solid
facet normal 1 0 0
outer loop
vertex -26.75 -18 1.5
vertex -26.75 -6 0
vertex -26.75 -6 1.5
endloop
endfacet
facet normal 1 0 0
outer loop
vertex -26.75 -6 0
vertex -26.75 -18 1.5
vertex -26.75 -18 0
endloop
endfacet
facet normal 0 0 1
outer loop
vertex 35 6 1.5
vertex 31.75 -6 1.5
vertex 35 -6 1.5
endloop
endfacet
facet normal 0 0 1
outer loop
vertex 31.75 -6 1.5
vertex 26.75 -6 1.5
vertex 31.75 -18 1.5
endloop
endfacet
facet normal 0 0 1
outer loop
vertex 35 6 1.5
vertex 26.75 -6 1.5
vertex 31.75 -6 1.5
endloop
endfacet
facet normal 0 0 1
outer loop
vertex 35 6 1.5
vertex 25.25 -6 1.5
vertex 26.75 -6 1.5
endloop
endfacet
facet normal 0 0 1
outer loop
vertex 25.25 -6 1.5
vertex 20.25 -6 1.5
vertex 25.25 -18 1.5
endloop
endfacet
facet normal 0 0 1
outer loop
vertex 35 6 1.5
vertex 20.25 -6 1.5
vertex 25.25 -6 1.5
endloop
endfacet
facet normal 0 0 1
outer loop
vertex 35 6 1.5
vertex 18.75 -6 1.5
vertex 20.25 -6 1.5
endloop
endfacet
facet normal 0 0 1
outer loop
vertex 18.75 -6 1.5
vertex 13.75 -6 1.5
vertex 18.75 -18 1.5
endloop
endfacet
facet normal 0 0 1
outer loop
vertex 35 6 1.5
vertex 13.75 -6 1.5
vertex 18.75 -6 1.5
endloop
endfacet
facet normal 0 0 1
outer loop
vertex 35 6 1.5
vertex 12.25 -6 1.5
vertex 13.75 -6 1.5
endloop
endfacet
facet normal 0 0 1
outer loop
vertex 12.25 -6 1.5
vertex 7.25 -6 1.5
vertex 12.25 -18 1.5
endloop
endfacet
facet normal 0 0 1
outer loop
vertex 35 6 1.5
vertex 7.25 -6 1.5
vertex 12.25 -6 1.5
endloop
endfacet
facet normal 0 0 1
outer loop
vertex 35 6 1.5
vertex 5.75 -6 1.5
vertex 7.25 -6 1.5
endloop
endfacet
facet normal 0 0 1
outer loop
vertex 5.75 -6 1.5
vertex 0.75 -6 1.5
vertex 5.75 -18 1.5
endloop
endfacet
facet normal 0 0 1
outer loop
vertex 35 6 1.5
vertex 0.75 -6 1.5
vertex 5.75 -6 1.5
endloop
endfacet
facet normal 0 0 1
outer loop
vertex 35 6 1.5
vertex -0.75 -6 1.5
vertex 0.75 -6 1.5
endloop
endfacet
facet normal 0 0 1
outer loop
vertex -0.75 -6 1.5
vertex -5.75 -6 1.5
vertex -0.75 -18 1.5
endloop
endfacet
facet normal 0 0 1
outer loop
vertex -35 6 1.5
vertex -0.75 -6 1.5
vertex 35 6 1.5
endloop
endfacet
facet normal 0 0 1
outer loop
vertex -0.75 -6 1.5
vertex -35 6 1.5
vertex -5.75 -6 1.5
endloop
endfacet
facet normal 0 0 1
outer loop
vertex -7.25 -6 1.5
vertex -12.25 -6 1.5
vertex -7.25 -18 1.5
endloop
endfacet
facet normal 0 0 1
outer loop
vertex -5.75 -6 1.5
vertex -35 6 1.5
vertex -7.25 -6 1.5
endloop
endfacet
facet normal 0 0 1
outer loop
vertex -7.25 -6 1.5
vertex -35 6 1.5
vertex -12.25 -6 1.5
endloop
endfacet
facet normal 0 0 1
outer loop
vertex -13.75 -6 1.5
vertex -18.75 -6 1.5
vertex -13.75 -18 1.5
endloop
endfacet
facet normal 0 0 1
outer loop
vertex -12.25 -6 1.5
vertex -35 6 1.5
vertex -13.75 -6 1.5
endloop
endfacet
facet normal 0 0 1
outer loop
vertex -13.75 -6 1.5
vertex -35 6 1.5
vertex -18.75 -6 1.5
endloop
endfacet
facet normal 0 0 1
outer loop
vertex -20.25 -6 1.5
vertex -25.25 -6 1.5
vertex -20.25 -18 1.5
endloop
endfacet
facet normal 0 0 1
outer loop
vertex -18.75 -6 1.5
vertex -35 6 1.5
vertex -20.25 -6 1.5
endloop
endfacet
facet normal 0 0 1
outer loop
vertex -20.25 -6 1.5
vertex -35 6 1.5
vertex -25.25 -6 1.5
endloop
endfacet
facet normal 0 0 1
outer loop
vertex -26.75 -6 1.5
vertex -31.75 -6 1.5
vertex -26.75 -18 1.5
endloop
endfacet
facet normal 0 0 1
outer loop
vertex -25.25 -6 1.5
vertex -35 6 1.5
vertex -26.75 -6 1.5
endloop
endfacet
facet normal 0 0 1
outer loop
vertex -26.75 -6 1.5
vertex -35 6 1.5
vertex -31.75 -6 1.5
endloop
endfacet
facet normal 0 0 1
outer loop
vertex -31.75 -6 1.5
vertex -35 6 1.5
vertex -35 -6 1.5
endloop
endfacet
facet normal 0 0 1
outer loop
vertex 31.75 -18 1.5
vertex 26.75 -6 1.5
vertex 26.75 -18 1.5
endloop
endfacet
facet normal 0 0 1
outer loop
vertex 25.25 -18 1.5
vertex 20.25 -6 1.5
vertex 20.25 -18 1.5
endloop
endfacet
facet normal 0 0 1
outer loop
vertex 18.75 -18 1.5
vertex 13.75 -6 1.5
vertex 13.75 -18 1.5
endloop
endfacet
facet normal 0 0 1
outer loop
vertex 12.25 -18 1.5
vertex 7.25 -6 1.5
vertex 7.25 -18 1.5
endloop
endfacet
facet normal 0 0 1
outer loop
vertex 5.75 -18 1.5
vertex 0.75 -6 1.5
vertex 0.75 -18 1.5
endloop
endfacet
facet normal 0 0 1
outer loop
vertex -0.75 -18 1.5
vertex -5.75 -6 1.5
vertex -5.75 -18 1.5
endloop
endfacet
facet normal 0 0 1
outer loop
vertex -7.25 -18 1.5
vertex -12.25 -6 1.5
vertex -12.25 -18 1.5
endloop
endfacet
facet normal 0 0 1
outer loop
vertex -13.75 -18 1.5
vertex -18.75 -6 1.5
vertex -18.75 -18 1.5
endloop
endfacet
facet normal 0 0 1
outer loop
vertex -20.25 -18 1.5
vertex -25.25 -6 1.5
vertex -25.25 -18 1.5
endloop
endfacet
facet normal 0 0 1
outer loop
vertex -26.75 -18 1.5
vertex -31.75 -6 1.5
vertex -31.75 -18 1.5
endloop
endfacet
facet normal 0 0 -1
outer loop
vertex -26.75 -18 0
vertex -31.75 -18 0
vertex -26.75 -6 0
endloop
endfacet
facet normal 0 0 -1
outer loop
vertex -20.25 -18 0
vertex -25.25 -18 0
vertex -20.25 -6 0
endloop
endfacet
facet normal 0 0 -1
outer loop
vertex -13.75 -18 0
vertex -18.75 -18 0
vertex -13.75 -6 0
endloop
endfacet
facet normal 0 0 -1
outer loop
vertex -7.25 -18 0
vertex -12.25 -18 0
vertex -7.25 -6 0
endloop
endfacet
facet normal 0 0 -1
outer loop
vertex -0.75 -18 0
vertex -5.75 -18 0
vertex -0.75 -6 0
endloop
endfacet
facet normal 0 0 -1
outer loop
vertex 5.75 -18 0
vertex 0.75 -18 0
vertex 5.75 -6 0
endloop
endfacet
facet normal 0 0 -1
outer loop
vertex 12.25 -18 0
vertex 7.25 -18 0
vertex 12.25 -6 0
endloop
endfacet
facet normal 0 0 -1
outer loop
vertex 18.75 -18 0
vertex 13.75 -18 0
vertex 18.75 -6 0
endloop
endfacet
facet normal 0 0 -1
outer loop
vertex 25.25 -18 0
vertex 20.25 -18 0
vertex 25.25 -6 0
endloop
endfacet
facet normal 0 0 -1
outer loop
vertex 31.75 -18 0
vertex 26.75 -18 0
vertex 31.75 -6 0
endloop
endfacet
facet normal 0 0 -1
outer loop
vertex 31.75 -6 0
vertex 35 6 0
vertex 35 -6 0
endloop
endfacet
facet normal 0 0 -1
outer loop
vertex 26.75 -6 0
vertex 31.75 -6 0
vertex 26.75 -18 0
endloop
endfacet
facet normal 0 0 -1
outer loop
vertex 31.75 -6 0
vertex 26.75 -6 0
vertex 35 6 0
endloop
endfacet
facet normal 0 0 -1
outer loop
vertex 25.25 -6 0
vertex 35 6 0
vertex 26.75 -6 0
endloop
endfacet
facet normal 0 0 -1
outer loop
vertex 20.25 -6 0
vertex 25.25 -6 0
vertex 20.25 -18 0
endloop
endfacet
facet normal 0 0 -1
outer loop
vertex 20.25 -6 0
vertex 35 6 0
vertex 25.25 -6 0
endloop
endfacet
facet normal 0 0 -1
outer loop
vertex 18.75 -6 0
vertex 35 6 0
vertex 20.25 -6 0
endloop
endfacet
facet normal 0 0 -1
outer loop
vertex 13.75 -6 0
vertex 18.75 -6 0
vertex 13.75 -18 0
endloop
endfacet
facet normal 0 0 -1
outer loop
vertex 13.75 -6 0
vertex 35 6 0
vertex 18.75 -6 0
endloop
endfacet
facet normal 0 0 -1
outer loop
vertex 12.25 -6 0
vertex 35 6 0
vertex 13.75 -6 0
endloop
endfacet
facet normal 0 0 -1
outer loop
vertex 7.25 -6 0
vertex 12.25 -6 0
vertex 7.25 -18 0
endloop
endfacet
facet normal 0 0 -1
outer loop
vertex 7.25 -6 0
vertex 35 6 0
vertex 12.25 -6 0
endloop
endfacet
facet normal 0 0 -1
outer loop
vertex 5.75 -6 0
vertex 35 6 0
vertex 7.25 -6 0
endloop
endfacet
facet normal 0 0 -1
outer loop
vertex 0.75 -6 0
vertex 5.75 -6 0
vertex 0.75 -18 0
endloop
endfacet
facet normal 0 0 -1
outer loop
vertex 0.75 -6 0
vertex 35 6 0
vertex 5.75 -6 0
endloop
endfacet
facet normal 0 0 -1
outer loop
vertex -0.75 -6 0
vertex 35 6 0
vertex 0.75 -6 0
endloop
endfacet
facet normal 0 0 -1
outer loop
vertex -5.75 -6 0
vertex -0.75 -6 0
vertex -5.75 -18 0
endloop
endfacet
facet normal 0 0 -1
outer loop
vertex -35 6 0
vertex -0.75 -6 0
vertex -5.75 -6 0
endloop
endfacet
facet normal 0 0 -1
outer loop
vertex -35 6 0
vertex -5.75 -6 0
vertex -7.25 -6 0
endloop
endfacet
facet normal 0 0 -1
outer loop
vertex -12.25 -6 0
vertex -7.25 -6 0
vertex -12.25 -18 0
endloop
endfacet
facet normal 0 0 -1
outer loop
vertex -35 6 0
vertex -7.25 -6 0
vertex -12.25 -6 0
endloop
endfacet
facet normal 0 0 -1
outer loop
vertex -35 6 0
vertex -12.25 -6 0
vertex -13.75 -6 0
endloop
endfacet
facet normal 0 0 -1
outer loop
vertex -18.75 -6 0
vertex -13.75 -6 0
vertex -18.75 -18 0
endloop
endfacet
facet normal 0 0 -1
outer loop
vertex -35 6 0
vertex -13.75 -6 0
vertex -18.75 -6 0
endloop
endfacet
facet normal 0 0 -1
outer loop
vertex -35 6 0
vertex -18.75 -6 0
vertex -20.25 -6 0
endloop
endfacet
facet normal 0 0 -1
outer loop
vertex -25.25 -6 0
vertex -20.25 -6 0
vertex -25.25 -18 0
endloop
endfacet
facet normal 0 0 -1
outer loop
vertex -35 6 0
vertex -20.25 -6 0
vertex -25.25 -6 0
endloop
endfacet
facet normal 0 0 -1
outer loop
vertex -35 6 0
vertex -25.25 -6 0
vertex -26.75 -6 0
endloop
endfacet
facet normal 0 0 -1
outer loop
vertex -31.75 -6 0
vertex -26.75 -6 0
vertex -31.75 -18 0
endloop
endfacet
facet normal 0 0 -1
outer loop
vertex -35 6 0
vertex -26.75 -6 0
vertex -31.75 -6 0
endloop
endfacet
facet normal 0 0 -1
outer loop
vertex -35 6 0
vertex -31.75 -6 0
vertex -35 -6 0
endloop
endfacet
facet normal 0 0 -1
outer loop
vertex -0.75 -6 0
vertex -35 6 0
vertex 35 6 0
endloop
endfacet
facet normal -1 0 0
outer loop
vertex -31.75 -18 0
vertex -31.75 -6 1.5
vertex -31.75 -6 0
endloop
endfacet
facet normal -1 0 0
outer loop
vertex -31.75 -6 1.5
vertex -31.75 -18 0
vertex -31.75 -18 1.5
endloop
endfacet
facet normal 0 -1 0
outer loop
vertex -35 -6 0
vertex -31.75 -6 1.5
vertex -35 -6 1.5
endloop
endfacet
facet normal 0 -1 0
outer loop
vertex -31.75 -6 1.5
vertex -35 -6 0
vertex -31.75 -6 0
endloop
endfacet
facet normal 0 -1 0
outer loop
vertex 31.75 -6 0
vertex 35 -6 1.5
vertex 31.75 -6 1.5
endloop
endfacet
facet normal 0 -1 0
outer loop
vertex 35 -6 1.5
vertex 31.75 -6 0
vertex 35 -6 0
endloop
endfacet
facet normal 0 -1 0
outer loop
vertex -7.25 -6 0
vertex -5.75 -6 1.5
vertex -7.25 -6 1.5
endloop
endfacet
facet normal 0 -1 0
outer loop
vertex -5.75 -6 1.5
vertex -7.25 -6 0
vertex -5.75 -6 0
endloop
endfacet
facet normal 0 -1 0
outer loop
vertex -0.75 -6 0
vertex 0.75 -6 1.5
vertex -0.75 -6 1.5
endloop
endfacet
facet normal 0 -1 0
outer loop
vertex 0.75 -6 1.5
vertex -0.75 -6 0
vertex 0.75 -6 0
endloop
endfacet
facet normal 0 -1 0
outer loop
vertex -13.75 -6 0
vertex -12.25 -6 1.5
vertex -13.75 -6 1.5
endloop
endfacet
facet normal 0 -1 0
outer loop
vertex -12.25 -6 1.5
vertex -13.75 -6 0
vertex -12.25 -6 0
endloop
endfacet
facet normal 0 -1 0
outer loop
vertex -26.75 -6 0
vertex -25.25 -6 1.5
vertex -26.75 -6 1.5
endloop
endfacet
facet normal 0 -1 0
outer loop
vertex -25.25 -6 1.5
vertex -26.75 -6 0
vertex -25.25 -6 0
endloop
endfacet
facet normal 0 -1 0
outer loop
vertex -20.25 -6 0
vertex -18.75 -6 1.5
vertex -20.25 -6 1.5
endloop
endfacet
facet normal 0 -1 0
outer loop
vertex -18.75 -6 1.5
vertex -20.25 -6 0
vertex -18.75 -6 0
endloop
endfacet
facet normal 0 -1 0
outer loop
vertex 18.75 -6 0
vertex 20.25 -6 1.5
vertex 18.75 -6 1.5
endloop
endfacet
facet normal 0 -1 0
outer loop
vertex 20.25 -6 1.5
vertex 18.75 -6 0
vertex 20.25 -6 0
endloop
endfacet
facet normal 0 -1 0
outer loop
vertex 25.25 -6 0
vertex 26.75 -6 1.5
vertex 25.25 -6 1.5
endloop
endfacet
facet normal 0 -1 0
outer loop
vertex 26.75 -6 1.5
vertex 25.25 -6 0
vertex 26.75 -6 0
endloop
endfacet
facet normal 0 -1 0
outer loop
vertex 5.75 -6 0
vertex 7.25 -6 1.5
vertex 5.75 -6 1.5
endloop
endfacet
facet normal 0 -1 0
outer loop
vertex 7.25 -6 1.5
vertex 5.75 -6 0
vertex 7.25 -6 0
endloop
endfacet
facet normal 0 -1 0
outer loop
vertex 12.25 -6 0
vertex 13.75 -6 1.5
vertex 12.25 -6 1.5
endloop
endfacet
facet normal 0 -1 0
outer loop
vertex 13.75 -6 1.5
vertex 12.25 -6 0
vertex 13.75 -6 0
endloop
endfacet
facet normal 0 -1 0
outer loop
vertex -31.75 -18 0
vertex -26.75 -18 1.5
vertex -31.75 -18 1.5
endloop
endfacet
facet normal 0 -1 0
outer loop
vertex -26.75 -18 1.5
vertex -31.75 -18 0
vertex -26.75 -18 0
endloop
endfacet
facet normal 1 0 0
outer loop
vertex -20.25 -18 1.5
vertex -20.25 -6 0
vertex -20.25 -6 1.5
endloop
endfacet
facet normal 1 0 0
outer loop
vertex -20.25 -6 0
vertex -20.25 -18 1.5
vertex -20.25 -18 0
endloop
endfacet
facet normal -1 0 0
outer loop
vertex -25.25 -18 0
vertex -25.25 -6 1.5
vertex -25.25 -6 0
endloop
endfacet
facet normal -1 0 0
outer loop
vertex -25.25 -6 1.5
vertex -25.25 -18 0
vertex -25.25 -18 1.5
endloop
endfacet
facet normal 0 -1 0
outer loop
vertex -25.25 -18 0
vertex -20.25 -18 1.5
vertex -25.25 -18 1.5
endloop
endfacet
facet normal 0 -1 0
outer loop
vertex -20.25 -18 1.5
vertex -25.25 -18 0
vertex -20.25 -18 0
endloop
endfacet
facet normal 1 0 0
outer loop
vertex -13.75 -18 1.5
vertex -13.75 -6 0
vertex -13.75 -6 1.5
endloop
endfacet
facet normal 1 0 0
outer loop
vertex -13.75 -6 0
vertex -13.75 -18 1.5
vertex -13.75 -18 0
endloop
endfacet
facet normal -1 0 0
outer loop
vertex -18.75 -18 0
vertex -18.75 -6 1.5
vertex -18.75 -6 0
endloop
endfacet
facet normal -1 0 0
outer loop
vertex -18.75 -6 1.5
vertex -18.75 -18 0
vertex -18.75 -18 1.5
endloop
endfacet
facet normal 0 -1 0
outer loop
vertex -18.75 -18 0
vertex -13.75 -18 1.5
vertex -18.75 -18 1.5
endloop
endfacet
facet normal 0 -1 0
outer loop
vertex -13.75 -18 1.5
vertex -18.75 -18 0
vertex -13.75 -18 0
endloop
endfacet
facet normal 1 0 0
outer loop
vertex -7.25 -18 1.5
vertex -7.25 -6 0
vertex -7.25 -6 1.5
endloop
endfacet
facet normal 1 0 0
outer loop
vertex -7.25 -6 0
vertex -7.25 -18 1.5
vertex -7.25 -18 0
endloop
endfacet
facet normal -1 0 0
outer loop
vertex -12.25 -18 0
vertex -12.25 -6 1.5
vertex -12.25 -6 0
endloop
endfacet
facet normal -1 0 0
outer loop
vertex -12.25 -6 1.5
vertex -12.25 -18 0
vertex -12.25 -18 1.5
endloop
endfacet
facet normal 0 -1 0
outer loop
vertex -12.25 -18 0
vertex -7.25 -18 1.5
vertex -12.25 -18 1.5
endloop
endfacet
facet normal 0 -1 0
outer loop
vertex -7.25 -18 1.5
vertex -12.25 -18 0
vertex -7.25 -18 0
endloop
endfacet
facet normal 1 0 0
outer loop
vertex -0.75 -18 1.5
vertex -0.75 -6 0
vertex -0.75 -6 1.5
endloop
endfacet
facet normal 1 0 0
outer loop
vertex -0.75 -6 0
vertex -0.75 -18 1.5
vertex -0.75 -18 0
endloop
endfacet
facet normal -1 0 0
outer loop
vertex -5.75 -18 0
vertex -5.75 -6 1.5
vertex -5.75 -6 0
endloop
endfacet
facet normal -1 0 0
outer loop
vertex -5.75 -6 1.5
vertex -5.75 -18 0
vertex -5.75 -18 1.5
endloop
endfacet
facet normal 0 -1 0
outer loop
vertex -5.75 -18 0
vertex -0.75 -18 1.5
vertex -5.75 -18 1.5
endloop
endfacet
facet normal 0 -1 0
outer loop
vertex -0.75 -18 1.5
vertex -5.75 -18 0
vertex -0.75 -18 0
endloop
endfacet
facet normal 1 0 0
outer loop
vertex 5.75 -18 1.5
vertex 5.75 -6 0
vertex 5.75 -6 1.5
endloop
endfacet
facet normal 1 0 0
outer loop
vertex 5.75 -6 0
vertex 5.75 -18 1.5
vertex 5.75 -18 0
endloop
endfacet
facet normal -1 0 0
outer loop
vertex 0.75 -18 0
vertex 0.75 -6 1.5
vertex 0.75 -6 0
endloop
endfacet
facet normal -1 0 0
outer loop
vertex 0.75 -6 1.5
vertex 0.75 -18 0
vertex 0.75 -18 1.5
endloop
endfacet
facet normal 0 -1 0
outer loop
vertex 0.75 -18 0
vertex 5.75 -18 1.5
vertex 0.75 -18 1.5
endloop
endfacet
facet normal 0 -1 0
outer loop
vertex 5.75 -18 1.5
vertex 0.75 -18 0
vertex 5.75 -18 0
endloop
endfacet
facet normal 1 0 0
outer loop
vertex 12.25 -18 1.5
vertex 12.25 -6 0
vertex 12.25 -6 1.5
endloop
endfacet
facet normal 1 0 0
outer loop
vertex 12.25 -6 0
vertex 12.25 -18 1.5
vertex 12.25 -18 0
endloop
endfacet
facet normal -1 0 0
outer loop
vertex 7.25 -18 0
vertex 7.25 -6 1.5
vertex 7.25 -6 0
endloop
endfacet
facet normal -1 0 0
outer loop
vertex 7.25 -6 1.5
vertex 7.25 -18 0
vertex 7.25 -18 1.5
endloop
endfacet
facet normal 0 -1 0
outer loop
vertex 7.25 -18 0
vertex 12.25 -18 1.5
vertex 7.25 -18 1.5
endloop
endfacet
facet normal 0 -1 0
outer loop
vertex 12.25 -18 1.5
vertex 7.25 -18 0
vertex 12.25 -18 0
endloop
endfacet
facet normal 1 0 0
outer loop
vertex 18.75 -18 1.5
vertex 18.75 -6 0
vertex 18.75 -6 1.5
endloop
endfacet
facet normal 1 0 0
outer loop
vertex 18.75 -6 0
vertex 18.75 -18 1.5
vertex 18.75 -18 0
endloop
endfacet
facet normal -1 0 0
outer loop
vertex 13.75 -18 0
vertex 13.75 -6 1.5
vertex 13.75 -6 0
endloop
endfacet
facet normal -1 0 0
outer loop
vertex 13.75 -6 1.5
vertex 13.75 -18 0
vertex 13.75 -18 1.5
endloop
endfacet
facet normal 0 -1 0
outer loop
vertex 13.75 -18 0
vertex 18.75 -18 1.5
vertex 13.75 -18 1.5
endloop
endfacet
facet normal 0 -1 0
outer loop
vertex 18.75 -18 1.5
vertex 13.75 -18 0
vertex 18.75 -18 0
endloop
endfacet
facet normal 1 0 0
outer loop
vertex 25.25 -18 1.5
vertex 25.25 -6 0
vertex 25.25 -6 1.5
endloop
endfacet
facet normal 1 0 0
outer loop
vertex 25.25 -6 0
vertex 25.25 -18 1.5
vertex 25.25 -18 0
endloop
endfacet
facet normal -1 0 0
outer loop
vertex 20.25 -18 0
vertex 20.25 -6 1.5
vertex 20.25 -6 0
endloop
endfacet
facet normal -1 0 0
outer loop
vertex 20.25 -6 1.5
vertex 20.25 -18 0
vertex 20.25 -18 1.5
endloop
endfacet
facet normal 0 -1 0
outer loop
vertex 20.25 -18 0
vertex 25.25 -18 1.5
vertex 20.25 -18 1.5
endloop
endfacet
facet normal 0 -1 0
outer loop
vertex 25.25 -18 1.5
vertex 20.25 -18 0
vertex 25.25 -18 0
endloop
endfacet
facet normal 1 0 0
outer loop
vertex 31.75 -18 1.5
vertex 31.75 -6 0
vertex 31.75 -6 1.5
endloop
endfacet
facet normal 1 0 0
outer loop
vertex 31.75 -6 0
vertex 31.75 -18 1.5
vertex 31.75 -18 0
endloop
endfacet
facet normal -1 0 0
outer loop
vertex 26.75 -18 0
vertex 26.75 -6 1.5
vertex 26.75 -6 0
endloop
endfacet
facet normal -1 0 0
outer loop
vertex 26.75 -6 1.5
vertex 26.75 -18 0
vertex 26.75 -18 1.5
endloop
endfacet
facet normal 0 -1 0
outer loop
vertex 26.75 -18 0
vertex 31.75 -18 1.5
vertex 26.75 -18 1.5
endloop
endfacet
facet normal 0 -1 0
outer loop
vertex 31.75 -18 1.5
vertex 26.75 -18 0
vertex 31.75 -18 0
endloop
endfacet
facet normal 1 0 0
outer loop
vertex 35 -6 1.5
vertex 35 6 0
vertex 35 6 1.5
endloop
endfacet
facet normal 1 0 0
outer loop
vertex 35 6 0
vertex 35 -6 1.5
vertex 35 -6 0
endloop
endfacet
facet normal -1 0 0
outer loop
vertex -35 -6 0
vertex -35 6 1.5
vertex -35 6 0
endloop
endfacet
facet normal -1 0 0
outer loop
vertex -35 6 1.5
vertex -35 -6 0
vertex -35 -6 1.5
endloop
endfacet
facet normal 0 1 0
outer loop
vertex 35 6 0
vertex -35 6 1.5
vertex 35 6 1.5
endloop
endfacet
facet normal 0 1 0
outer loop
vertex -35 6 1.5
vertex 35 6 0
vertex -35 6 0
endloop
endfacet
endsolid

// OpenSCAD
// 10-well comb for casting agarose gels
// Printed lying flat: plate on bed (z = 0), teeth hang in -Y direction

// ---------- Parameters ----------
plate_t      = 1.5;    // plate thickness (Z)
spine_len    = 70;     // spine length along X
spine_w      = 12;     // spine width along Y
tooth_count  = 10;     // number of teeth
tooth_w      = 5.0;    // tooth width along X
tooth_len    = 12;     // tooth length along Y
gap          = 1.5;    // gap between neighbouring teeth (X)
eps          = 0.5;    // cutter overshoot past faces

$fn = 64;

// ---------- Derived ----------
pitch   = tooth_w + gap;               // centre-to-centre spacing
x_start = -(tooth_count - 1) * pitch / 2; // first tooth centre (row centred on spine)
total_w = tooth_count * tooth_w + (tooth_count - 1) * gap; // row width in X

// ---------- Model ----------
union() {
    // Spine (back bar)
    translate([-spine_len / 2, -spine_w / 2, 0])
        cube([spine_len, spine_w, plate_t]);

    // Teeth
    for (i = [0 : tooth_count - 1])
        translate([x_start + i * pitch - tooth_w / 2,
                   -spine_w / 2 - tooth_len,
                   0])
            cube([tooth_w, tooth_len, plate_t]);
}
